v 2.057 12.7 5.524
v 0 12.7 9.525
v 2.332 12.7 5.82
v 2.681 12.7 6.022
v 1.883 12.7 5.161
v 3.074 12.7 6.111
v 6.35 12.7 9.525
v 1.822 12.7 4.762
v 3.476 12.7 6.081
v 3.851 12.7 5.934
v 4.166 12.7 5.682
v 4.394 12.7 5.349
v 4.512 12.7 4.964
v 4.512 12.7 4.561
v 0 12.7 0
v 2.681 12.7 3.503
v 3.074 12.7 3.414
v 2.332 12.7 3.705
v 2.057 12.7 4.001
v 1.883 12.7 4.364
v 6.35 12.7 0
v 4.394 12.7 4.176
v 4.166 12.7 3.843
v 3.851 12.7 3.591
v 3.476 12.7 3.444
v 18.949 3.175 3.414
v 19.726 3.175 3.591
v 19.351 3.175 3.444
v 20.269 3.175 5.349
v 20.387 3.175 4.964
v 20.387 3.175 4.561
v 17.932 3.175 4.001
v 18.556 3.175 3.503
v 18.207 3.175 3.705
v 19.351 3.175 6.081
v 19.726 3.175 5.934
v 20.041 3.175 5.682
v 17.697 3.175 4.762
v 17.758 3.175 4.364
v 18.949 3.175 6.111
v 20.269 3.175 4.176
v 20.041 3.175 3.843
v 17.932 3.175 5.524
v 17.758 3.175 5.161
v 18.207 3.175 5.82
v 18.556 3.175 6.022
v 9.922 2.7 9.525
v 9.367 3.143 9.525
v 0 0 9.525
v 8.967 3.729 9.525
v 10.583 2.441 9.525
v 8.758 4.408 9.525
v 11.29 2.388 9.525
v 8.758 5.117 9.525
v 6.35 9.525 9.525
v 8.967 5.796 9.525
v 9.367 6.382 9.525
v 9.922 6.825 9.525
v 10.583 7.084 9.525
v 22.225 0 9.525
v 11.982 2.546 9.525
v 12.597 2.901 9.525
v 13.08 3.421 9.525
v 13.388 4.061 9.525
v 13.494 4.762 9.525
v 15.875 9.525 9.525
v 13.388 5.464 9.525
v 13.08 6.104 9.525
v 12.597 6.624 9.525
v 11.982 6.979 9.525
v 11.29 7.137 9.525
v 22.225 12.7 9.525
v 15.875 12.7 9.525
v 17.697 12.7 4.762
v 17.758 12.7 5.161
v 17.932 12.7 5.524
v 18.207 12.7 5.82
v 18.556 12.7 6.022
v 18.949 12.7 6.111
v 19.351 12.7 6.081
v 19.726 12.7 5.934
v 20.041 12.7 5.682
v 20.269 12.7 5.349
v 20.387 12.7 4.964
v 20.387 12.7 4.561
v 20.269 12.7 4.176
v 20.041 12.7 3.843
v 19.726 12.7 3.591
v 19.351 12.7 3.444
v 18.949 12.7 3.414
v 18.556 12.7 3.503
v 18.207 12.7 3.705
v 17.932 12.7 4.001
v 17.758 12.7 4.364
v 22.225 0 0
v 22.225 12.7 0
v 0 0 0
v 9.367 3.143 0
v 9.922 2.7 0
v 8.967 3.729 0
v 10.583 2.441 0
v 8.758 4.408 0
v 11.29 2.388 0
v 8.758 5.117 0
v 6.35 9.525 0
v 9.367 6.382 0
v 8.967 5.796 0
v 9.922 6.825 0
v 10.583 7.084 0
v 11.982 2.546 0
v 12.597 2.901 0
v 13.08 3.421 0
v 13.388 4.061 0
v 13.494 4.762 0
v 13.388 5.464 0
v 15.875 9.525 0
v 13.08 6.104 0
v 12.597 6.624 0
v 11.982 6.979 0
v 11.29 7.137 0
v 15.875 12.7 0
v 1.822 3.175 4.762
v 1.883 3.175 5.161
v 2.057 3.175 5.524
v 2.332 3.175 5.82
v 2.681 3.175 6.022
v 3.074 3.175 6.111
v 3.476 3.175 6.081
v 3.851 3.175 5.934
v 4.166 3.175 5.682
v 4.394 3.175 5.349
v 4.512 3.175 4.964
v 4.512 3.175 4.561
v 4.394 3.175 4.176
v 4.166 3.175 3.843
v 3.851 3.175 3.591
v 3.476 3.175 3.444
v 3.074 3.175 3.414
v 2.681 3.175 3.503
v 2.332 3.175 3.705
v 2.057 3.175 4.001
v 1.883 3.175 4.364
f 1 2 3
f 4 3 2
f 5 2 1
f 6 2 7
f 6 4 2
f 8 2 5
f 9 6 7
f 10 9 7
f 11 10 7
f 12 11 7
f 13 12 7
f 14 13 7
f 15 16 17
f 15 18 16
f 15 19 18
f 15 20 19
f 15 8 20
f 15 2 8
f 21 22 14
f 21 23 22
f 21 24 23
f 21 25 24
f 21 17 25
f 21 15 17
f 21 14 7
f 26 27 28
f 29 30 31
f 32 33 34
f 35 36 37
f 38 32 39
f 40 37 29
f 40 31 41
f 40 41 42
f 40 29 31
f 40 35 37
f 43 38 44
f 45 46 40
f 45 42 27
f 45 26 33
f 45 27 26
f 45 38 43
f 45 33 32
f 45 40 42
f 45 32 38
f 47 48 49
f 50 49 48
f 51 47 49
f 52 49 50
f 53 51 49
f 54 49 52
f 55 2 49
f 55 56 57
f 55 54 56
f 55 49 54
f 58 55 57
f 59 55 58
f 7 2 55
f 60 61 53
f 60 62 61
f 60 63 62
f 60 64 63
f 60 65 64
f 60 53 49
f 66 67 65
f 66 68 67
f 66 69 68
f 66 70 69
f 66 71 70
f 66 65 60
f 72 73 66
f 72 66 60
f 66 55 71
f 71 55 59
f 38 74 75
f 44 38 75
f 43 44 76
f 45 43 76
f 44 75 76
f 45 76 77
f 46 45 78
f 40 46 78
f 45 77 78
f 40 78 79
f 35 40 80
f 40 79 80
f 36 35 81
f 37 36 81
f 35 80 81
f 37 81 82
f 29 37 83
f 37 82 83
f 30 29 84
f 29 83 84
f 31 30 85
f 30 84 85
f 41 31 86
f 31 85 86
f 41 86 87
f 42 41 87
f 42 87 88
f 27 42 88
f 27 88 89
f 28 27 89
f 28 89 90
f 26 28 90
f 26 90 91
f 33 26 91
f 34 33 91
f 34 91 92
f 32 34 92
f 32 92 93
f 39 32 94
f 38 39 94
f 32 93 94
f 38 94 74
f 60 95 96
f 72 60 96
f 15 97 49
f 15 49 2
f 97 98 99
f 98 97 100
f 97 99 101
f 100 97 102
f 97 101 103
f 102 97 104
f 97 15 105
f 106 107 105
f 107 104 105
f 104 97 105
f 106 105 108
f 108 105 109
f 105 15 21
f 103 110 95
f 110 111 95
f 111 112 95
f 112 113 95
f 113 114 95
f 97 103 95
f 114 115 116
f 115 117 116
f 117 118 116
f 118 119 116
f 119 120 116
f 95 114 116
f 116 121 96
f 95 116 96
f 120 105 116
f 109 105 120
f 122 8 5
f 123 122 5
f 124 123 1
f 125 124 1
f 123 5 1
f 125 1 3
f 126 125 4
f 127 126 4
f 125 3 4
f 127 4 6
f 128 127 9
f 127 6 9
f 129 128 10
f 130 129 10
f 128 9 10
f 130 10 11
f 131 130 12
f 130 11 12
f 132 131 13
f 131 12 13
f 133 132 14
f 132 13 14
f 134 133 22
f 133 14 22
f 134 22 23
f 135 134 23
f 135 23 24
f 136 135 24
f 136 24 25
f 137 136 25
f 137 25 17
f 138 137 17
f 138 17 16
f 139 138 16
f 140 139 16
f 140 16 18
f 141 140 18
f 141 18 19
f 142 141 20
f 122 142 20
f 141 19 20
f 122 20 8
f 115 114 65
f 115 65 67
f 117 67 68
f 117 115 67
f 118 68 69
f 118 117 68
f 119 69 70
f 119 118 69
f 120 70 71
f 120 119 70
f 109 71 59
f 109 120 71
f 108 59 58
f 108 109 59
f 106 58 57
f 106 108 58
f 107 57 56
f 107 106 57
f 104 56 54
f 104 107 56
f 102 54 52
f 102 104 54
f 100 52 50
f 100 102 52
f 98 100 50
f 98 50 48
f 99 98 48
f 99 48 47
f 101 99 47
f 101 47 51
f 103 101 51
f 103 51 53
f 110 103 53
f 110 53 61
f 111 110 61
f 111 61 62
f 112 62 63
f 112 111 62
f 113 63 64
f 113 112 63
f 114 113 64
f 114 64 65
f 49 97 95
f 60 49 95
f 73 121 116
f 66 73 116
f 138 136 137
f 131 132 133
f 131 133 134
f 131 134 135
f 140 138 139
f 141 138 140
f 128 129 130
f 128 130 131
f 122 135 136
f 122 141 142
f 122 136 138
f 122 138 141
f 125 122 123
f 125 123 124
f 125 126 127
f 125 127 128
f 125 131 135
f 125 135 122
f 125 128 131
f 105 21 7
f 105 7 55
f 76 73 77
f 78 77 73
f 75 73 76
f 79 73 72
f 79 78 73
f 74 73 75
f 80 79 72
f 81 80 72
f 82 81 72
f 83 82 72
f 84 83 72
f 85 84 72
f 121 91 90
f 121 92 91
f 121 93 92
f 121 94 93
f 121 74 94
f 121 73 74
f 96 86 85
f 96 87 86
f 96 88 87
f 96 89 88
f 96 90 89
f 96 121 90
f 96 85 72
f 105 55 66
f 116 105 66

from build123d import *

# Parameters (mm, degrees)
F0_W     = 22.225
F0_H     = 12.7
F0_R     = 2.38125
F1_DEPTH = 9.525
F2_R     = 1.35255
F3_DEPTH = 9.525
F4_W     = 9.525
F4_H     = 3.175
F5_DEPTH = 9.525


with BuildPart() as f1:
    # F0 (on Top) → F1 (new body)
    with BuildSketch(Plane.XY):
        with Locations((11.1125, 6.35)):
            Rectangle(F0_W, F0_H)
        with Locations((11.1125, 4.7625)):
            Circle(F0_R, mode=Mode.SUBTRACT)
    extrude(amount=F1_DEPTH)

    # F2 (on face) → F3 (cut)
    with BuildSketch(Plane(origin=(0, 12.7, 0), x_dir=(-1, 0, 0), z_dir=(0, 1, 0))):
        with Locations((-3.175, 4.7625)):
            Circle(F2_R)
        with Locations((-19.05, 4.7625)):
            Circle(F2_R)
    extrude(amount=-F3_DEPTH, mode=Mode.SUBTRACT)

    # F4 (on face) → F5 (cut, through all)
    with BuildSketch(Plane(origin=(0, 0, 0), x_dir=(1, 0, 0), z_dir=(0, 0, -1))):
        with Locations((11.1125, -11.1125)):
            Rectangle(F4_W, F4_H)
    extrude(amount=-F5_DEPTH, mode=Mode.SUBTRACT)


solid = f1.part
